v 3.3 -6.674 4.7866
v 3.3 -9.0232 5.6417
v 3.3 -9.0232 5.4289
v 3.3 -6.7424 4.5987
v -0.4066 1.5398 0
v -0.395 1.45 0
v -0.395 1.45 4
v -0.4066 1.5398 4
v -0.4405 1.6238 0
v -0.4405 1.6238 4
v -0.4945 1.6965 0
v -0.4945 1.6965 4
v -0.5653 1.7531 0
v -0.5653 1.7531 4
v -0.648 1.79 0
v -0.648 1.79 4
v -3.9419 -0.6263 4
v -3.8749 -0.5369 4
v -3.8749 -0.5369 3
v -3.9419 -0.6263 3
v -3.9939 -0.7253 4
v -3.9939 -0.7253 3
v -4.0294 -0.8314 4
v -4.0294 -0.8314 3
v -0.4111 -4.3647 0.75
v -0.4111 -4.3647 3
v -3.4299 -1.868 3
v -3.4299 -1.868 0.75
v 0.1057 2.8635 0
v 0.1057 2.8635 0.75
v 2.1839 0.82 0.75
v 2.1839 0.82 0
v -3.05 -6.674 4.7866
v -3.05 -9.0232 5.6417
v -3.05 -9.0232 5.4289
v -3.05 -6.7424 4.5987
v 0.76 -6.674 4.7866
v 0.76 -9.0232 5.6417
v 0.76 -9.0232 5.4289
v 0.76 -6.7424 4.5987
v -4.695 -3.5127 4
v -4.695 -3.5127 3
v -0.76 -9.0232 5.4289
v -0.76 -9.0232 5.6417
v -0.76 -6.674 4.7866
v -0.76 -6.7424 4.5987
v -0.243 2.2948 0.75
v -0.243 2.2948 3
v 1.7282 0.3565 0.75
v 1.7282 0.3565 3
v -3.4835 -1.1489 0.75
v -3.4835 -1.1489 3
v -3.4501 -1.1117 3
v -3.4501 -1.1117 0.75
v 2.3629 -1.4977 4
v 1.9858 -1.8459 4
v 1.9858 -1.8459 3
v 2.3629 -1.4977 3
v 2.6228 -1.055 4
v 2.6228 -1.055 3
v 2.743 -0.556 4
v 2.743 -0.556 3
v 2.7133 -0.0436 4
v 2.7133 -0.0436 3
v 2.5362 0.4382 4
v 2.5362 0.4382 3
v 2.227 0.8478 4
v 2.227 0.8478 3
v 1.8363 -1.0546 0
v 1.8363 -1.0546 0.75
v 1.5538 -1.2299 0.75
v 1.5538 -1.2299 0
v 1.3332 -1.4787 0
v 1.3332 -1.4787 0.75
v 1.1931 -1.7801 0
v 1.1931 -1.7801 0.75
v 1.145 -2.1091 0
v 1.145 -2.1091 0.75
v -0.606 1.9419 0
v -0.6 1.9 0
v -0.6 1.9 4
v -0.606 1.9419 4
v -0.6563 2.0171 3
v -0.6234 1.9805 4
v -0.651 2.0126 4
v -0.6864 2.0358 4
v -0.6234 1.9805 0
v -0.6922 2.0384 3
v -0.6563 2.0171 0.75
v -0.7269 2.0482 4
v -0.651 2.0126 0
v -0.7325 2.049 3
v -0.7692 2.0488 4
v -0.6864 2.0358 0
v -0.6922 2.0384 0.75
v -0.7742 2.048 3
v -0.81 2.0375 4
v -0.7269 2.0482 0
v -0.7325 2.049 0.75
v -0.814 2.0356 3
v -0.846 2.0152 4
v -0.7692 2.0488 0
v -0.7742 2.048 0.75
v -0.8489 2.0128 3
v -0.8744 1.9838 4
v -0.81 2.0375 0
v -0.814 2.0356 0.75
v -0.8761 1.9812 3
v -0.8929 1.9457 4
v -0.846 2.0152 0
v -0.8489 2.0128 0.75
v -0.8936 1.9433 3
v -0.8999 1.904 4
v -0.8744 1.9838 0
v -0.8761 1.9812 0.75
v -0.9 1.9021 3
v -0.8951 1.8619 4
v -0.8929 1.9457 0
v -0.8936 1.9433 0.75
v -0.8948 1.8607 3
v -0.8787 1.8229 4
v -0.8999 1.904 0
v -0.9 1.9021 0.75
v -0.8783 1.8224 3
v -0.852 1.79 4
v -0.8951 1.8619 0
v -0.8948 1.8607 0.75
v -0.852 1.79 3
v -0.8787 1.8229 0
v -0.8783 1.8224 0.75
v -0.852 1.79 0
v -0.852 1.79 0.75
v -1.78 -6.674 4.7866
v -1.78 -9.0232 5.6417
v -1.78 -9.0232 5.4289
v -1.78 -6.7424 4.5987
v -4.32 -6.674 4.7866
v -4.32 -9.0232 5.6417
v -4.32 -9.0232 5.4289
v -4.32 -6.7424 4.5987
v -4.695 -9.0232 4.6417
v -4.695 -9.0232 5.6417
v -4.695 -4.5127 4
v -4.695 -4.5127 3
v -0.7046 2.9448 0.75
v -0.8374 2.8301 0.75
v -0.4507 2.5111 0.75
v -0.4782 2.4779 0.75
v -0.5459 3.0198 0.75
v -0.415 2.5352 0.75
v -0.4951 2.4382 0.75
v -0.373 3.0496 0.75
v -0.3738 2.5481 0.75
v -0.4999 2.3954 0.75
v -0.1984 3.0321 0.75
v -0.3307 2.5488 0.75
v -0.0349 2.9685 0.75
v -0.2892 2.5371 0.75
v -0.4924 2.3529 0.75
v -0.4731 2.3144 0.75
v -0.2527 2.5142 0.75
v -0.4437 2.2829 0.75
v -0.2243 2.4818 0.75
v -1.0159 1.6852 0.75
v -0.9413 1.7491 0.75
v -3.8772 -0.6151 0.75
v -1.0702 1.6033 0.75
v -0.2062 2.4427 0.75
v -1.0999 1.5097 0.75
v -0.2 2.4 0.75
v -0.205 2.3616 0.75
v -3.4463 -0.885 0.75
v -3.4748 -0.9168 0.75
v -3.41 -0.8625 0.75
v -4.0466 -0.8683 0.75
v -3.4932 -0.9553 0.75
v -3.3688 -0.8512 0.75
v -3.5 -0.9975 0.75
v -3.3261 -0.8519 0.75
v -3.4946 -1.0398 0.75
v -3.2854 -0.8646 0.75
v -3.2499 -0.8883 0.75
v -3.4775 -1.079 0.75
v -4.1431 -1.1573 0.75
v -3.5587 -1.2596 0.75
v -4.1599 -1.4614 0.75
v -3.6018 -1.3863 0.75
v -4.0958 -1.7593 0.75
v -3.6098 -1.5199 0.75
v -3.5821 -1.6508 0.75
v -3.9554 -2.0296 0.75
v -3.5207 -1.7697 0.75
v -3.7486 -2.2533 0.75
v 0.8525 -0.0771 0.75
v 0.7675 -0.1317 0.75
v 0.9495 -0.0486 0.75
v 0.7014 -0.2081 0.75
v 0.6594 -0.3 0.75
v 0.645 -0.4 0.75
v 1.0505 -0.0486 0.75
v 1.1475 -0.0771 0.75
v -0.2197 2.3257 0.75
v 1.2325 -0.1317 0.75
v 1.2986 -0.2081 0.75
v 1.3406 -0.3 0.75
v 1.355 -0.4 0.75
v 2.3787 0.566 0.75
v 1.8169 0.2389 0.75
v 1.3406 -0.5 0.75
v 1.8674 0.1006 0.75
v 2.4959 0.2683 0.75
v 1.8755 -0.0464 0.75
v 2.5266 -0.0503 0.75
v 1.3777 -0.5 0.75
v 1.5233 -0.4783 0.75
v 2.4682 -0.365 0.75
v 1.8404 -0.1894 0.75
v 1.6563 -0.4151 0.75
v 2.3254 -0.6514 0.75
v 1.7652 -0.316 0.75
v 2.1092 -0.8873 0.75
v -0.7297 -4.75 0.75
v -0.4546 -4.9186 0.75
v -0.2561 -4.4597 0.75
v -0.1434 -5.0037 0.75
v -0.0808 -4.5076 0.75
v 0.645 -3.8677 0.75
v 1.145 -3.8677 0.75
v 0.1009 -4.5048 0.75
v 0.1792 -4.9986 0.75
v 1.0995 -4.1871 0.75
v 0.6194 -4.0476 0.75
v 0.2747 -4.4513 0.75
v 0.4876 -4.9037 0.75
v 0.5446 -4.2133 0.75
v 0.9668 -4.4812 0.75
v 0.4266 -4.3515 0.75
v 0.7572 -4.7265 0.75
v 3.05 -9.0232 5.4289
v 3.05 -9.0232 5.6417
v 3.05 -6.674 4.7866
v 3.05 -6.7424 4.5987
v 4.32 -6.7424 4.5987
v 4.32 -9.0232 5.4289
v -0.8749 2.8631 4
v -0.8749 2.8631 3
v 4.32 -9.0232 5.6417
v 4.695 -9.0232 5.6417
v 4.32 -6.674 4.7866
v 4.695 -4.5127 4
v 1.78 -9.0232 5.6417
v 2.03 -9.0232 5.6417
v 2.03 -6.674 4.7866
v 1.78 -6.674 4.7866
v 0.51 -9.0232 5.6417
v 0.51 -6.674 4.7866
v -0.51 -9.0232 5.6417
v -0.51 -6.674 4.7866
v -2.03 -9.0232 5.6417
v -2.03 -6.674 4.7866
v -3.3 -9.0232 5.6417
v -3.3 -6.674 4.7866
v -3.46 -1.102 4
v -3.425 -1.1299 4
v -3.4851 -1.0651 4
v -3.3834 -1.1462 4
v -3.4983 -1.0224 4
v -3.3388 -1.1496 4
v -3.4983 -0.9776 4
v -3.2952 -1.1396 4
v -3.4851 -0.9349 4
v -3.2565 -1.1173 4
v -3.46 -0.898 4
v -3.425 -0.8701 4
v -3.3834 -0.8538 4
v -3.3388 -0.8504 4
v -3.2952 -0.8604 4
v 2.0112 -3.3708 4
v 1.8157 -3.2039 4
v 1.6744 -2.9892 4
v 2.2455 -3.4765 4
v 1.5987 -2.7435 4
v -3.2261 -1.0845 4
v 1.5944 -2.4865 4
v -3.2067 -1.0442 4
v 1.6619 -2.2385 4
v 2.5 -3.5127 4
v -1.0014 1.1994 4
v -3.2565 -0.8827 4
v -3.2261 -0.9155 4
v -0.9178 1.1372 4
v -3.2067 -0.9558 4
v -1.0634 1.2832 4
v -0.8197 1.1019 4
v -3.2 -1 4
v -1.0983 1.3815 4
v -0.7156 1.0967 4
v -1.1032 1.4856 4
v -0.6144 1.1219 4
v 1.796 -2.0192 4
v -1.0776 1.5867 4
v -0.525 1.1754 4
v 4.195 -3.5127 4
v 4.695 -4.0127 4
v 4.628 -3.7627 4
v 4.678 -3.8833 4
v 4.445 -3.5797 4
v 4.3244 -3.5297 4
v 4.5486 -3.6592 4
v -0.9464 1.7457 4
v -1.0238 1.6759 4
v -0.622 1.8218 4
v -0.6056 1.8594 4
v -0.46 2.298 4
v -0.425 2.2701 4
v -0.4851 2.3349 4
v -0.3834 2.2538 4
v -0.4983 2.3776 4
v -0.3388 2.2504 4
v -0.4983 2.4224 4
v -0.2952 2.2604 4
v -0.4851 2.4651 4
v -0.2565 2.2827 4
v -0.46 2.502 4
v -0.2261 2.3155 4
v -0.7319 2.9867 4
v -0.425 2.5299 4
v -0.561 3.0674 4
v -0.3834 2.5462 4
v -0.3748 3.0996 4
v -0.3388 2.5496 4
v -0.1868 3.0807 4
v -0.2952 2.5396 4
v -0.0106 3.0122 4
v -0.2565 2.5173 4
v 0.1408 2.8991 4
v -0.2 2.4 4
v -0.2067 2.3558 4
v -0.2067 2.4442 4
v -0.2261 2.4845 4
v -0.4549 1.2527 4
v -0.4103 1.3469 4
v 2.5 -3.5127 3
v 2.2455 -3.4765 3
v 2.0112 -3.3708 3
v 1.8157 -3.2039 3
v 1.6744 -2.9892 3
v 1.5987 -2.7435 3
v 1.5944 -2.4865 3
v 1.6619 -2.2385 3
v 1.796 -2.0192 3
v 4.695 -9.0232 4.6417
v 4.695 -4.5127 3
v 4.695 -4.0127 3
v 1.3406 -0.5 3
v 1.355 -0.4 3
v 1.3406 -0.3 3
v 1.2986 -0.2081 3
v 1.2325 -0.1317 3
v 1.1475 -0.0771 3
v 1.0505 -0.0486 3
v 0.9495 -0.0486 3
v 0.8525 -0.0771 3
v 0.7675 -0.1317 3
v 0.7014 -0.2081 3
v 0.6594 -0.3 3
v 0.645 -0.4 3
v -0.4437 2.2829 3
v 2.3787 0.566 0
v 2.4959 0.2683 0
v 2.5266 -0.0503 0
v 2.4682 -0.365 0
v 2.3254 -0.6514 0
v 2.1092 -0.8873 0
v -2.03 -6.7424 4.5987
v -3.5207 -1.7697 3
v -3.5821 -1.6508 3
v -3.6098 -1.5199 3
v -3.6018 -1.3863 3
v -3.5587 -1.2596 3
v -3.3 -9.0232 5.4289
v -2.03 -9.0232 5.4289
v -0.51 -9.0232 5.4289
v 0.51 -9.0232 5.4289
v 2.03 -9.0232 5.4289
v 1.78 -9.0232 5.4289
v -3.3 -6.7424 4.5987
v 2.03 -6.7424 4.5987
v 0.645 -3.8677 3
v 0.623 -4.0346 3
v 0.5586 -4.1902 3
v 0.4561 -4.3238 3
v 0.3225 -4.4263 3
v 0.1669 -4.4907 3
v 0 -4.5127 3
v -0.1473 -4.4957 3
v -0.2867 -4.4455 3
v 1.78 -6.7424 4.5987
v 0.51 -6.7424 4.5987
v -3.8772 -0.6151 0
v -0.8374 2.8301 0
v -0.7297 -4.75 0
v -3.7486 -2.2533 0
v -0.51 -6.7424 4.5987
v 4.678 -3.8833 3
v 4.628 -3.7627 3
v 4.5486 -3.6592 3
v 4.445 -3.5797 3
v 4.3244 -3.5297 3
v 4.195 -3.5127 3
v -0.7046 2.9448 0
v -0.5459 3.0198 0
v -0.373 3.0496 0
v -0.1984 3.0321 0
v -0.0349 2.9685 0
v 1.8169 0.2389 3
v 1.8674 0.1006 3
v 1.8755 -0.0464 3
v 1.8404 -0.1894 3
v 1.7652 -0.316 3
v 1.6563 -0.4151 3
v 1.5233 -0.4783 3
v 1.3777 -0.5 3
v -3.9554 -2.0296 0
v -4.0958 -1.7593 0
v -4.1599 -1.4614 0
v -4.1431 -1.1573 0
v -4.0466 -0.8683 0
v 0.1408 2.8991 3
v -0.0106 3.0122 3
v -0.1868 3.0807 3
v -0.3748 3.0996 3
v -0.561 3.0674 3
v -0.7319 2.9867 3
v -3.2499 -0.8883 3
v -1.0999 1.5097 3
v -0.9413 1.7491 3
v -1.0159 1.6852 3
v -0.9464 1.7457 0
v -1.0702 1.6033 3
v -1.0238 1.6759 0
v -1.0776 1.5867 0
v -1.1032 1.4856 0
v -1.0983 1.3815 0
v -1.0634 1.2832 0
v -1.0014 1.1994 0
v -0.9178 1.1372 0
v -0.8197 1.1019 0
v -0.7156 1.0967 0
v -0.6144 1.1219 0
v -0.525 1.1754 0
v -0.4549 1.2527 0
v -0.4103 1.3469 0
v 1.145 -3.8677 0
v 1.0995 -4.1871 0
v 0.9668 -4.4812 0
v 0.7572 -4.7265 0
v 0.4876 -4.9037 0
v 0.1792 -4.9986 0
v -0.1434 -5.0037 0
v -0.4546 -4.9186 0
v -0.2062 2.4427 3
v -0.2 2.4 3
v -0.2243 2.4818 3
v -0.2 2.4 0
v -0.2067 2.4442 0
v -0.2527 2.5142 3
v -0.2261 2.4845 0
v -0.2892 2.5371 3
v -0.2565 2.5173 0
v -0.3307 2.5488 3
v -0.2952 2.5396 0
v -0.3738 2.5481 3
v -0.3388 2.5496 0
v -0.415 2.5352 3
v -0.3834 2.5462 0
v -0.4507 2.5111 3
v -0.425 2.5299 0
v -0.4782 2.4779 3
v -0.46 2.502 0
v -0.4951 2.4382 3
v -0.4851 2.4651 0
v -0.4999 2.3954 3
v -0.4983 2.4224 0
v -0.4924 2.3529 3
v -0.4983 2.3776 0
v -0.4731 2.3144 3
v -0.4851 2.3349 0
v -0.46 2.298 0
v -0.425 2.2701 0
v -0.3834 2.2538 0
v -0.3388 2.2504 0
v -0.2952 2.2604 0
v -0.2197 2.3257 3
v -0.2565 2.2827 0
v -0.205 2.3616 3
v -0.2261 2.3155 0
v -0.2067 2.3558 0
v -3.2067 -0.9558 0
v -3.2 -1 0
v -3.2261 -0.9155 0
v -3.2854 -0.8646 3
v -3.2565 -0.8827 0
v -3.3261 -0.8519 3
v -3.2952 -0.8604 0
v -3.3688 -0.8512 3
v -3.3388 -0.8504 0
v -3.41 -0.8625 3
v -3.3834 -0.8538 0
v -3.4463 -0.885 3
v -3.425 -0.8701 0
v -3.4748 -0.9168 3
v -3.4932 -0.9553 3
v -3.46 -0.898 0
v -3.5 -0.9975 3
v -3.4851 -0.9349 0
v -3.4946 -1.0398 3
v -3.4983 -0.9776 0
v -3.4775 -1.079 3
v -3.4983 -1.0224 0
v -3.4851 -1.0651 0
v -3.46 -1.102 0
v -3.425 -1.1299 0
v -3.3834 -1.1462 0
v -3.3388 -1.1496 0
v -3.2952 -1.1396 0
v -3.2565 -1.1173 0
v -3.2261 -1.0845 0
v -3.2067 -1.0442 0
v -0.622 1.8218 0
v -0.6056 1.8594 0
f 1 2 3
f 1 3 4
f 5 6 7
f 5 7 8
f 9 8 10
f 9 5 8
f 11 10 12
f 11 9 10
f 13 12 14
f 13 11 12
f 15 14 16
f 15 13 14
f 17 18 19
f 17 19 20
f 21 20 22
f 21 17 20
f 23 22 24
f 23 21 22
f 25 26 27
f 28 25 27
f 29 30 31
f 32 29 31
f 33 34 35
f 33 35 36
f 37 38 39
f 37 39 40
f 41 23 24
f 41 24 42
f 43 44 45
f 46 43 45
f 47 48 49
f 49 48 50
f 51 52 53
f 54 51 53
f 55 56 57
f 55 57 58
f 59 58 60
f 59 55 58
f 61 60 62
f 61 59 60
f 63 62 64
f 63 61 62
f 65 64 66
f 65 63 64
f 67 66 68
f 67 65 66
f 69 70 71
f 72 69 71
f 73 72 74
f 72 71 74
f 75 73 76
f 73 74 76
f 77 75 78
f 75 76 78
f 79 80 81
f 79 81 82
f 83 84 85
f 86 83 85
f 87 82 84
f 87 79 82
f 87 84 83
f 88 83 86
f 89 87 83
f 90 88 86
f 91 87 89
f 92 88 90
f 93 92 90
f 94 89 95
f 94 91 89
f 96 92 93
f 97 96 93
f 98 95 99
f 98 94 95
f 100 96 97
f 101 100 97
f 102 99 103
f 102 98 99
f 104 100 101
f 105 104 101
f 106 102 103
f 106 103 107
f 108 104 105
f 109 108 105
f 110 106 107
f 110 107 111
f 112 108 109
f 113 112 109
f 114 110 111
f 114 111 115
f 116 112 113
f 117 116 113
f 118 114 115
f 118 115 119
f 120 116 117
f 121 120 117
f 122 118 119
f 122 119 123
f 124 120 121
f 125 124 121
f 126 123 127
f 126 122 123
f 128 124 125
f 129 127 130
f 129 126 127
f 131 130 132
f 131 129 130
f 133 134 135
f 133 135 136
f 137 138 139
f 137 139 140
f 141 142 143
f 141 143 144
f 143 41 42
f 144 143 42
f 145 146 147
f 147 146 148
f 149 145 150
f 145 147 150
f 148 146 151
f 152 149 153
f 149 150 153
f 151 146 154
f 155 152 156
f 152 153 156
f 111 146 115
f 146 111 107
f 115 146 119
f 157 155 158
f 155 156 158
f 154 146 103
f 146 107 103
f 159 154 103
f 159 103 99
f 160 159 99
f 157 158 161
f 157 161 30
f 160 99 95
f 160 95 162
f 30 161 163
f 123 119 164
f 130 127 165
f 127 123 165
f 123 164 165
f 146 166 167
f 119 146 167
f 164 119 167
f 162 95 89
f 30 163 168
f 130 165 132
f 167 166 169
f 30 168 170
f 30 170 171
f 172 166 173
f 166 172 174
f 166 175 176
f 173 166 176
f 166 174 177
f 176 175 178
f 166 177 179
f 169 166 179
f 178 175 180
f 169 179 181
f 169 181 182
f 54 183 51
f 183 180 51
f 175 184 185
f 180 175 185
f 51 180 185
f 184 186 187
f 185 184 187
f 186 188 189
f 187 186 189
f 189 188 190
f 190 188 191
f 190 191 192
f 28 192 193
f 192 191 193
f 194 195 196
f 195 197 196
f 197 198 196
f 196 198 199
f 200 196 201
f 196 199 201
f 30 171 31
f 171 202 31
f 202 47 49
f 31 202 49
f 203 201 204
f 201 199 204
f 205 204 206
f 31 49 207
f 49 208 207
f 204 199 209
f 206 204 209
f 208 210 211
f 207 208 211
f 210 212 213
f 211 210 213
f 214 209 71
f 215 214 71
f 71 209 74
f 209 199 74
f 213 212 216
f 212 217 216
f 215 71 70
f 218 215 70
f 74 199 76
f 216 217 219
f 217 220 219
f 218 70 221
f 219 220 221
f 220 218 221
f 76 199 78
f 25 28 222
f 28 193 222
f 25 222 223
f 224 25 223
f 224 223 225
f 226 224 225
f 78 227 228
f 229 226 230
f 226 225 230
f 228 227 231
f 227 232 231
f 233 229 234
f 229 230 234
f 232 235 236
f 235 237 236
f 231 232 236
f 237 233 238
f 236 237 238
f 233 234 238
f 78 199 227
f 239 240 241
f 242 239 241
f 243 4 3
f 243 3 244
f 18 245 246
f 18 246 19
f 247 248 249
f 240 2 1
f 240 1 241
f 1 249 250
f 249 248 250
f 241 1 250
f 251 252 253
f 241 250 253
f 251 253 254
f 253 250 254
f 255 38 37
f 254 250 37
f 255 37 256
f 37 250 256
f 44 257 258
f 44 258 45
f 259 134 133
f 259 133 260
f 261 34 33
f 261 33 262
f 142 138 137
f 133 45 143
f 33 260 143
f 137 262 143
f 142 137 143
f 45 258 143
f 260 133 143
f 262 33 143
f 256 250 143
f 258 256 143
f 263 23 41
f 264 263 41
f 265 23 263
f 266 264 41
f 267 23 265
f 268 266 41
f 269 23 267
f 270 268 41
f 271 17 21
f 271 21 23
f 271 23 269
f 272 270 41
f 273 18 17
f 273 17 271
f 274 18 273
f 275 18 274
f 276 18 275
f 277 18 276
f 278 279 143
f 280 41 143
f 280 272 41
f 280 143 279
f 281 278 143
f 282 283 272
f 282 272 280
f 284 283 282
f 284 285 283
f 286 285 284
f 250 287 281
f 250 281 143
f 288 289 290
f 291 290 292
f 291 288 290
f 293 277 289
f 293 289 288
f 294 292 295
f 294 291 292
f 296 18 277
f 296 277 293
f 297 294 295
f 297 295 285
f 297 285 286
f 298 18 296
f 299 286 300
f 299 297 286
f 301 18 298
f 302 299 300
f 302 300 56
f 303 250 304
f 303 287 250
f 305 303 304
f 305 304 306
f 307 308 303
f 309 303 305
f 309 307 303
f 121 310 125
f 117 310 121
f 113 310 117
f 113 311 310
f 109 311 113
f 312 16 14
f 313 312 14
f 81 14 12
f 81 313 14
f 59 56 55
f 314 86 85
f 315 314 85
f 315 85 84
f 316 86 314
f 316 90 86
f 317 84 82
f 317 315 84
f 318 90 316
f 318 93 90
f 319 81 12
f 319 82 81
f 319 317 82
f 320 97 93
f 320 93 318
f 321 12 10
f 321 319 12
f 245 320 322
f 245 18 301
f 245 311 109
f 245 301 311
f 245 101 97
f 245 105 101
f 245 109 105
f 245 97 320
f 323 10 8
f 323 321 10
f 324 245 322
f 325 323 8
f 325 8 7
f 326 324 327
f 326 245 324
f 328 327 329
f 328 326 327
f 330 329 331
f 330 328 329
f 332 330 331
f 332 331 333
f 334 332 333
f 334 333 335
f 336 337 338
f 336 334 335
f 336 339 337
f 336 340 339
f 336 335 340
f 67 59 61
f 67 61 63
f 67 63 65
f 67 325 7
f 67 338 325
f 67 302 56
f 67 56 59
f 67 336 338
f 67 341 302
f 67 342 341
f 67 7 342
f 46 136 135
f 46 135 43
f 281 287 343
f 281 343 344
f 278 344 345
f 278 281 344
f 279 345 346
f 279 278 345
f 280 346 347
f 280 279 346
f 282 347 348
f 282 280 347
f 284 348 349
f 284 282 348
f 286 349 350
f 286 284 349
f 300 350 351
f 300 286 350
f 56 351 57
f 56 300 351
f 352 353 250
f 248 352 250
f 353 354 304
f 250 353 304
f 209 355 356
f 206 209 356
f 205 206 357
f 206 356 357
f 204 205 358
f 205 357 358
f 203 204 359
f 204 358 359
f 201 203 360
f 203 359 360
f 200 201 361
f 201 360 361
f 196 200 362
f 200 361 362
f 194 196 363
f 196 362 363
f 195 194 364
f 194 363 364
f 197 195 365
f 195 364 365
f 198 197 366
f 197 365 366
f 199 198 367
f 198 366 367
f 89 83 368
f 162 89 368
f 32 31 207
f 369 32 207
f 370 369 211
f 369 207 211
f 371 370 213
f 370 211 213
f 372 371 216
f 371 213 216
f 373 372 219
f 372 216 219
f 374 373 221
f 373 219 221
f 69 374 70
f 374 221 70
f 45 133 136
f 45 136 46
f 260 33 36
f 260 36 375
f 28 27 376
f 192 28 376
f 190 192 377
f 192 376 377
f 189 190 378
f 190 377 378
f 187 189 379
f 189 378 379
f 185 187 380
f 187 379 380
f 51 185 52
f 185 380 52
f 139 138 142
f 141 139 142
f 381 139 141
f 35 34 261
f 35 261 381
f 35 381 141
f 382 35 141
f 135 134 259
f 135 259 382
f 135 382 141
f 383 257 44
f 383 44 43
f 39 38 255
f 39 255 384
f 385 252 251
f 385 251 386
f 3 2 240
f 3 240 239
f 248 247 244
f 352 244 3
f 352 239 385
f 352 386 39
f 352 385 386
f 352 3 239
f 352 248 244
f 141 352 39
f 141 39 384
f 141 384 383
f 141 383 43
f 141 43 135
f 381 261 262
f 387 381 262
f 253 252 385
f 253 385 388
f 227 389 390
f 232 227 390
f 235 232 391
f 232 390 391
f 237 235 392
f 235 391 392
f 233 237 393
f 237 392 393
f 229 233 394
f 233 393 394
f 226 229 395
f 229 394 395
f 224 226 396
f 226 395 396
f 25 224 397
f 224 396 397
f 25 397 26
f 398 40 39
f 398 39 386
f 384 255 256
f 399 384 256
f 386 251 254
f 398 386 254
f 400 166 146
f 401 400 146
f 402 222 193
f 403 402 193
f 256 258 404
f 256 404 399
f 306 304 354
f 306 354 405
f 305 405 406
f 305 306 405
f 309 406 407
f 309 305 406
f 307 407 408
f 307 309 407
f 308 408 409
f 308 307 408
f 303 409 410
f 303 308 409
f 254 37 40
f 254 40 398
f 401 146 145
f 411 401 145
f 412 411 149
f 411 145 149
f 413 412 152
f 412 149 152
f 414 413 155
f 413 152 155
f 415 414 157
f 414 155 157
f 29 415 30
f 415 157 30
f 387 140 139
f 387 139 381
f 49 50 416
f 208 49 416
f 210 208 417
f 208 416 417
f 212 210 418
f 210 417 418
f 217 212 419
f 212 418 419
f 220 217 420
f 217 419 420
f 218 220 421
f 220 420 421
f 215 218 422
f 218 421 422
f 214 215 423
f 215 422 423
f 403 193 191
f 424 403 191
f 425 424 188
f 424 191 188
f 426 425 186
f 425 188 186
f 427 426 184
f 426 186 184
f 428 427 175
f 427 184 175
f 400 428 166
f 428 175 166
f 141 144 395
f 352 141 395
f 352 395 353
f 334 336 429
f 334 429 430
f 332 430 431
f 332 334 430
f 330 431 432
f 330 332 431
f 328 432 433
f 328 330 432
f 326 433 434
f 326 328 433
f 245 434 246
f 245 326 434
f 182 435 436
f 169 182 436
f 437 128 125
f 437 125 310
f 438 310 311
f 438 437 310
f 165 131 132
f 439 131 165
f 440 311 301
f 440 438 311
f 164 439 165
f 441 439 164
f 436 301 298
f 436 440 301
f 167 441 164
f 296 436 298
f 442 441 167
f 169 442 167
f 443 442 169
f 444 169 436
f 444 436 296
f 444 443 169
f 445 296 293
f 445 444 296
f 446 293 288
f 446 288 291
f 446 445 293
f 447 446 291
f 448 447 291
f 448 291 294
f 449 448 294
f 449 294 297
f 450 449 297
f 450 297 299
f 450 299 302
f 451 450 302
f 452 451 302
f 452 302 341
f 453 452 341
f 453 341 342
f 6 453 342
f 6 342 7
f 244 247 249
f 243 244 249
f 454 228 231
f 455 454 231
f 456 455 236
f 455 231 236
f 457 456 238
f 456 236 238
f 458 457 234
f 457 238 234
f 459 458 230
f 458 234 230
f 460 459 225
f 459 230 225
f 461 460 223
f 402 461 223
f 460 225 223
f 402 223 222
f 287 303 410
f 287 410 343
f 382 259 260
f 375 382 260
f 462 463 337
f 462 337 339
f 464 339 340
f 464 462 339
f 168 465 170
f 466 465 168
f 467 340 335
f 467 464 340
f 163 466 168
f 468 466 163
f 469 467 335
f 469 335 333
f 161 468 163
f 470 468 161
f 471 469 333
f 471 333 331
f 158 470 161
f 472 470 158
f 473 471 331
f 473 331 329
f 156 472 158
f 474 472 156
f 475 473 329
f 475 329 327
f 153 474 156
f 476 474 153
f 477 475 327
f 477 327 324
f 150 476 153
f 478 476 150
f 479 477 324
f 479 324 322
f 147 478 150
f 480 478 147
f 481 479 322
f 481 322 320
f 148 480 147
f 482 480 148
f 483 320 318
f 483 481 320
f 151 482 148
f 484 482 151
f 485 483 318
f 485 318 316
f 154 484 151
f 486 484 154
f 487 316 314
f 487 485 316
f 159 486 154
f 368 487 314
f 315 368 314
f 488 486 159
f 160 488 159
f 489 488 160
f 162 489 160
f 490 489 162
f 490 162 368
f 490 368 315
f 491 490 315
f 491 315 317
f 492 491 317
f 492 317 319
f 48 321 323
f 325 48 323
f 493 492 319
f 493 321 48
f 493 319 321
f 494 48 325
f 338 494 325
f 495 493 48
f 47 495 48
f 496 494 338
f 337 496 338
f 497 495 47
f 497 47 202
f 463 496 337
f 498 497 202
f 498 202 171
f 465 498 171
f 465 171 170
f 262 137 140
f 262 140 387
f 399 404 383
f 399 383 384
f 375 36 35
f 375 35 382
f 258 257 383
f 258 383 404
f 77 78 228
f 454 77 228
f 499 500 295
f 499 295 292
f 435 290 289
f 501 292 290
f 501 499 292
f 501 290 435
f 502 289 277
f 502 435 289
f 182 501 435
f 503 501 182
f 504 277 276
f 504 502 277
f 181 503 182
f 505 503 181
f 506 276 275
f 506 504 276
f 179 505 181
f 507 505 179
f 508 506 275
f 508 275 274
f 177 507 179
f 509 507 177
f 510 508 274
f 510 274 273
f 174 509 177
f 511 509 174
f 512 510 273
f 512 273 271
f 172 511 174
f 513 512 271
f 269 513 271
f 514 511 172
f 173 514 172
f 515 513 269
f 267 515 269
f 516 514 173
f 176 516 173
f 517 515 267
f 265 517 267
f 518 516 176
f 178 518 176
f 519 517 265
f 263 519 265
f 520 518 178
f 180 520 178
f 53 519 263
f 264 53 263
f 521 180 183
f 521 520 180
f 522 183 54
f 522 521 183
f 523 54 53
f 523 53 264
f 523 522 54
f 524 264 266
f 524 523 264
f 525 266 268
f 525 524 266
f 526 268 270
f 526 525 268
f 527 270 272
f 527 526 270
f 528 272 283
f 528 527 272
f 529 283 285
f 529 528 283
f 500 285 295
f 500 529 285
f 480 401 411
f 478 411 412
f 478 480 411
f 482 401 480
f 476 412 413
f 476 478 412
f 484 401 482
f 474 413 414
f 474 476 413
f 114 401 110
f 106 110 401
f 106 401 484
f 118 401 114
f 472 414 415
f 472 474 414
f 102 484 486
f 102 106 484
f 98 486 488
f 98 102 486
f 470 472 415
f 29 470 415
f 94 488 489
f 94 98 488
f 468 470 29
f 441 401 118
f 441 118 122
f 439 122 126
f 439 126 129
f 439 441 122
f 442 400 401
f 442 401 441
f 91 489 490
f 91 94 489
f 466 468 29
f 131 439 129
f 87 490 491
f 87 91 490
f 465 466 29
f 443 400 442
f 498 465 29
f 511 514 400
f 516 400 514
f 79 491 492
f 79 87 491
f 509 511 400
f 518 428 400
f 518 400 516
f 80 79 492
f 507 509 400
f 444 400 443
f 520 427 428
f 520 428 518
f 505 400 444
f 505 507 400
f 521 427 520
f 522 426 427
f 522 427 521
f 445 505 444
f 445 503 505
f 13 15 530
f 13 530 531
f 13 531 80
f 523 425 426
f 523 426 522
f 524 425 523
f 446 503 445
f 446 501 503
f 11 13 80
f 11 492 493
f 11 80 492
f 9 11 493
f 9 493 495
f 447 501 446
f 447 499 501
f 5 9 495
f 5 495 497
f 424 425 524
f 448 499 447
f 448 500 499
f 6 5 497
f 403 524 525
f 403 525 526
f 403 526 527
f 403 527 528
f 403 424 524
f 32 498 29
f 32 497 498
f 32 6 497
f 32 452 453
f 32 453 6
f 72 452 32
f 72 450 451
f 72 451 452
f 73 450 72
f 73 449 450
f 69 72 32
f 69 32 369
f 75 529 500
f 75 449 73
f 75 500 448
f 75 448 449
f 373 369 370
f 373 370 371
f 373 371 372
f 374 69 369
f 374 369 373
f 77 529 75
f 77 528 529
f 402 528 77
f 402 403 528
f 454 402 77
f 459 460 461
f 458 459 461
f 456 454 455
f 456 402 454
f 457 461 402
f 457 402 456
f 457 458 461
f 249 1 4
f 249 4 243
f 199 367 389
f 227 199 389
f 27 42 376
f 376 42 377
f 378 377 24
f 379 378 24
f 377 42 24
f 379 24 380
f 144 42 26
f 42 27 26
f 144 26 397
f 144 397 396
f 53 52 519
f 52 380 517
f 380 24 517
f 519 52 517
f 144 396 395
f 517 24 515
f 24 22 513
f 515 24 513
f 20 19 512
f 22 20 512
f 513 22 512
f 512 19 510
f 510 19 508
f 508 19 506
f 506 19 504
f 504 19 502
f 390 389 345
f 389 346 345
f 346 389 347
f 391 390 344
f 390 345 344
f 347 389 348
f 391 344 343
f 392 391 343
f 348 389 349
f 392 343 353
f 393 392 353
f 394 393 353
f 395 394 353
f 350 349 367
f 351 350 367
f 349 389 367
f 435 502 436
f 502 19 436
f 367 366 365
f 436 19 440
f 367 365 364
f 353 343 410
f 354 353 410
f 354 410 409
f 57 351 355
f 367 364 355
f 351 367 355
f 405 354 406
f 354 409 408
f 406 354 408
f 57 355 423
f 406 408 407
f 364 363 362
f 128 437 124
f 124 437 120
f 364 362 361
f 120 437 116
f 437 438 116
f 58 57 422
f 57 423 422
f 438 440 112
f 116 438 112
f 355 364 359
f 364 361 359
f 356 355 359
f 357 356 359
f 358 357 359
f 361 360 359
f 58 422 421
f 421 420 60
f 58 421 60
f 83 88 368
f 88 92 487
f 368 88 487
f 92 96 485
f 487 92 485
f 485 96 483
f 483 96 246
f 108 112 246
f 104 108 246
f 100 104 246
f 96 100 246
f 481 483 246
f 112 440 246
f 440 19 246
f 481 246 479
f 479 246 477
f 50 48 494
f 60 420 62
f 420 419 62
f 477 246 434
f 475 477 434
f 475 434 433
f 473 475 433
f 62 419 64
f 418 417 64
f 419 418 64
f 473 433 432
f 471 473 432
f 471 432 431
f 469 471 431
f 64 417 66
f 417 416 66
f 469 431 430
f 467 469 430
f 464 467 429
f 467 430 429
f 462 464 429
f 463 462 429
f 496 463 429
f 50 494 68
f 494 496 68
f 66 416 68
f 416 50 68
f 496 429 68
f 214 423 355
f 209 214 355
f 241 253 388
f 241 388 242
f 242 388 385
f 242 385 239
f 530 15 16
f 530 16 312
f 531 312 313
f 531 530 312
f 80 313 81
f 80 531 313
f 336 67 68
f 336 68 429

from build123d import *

# Parameters (mm, degrees)
F3_R      = 0.15
F4_DEPTH  = 4
F3_R_2    = 0.85
F6_DEPTH  = 1
F8_DEPTH  = 2.25
F10_DEPTH = 0.75
F14_W     = 1.02
F14_H     = 2.5
F15_DEPTH = 0.2


with BuildPart() as f4:
    # F3 (on Top) → F4 (new body)
    with BuildSketch(Plane.XY):
        with Locations((-3.35, -1)):
            Circle(F3_R)
    extrude(amount=F4_DEPTH)


with BuildPart() as f4b:
    # F3 (on Top) → F4, piece 2 (new body)
    with BuildSketch(Plane.XY):
        with BuildLine():
            ThreePointArc((-0.6479896557, 1.7900277778), (-0.6125199075, 1.8400064655), (-0.6, 1.9))
            ThreePointArc((-0.6, 1.9), (-0.8099935345, 2.0374800925), (-0.8520103443, 1.7900277778))
            ThreePointArc((-0.8520103443, 1.7900277778), (-0.75, 1.805), (-0.6479896557, 1.7900277778))
        make_face()
        with BuildLine():
            ThreePointArc((-0.6479896557, 1.7900277778), (-0.75, 1.805), (-0.8520103443, 1.7900277778))
            ThreePointArc((-0.8520103443, 1.7900277778), (-0.75, 1.75), (-0.6479896557, 1.7900277778))
        make_face()
        with BuildLine():
            ThreePointArc((-0.6479896557, 1.7900277778), (-0.75, 1.75), (-0.8520103443, 1.7900277778))
            ThreePointArc((-0.8520103443, 1.7900277778), (-0.9619095654, 1.1651854356), (-0.395, 1.45))
            ThreePointArc((-0.395, 1.45), (-0.4651854356, 1.6619095654), (-0.6479896557, 1.7900277778))
        make_face()
    extrude(amount=F4_DEPTH)


with BuildPart() as f4c:
    # F3 (on Top) → F4, piece 3 (new body)
    with BuildSketch(Plane.XY):
        with Locations((-0.35, 2.4)):
            Circle(F3_R)
    extrude(amount=F4_DEPTH)


with BuildPart() as f4d:
    # F3 (on Top) → F4, piece 4 (new body)
    with BuildSketch(Plane.XY):
        with Locations((2.5, -2.6)):
            Circle(F3_R_2)
    extrude(amount=F4_DEPTH)


with BuildPart() as f6:
    # F5 (on face) → F6 (new body)
    with BuildSketch(Plane.XY.offset(4)):
        with BuildLine():
            ThreePointArc((1.9858394431, -1.8458978499), (2.7430307581, -0.5560249217), (2.2269639391, 0.8478218992))
            Line((2.2269639391, 0.8478218992), (0.1407855756, 2.8991287597))
            ThreePointArc((0.1407855756, 2.8991287597), (-0.3747911939, 3.0995608599), (-0.8748864988, 2.863135146))
            Line((-0.8748864988, 2.863135146), (-3.8748864988, -0.536864854))
            ThreePointArc((-3.8748864988, -0.536864854), (-3.9698749845, -0.674800056), (-4.0293801406, -0.831350587))
            Line((-4.0293801406, -0.831350587), (-4.695, -3.5127053911))
            Line((-4.695, -3.5127053911), (-4.695, -4.5127053911))
            Line((-4.695, -4.5127053911), (4.695, -4.5127053911))
            Line((4.695, -4.5127053911), (4.695, -4.0127053911))
            ThreePointArc((4.695, -4.0127053911), (4.5485533906, -3.6591520005), (4.195, -3.5127053911))
            Line((4.195, -3.5127053911), (2.5, -3.5127053911))
            ThreePointArc((2.5, -3.5127053911), (1.6278462782, -2.869033486), (1.9858394431, -1.8458978499))
        make_face()
    extrude(amount=-F6_DEPTH)

    # F7 (on face) → F8 (join)
    with BuildSketch(Plane(origin=(0, 0, 3), x_dir=(1, 0, 0), z_dir=(0, 0, -1))):
        with BuildLine():
            ThreePointArc((0.645, 3.8677053911), (0.2746634171, 4.4513020046), (-0.411077542, 4.3647368333))
            Line((-0.411077542, 4.3647368333), (-3.429889044, 1.8679820876))
            ThreePointArc((-3.429889044, 1.8679820876), (-3.6098399318, 1.5198675017), (-3.4835090032, 1.1489138881))
            Line((-3.4835090032, 1.1489138881), (-0.75, -1.9))
            Line((-0.75, -1.9), (-0.35, -2.4))
            Line((-0.35, -2.4), (1.7282178972, -0.3565205426))
            ThreePointArc((1.7282178972, -0.3565205426), (1.840398747, 0.1893934116), (1.3776567718, 0.5))
            Line((1.3776567718, 0.5), (1.3406244266, 0.5))
            ThreePointArc((1.3406244266, 0.5), (1.0505140008, 0.0486122715), (0.645, 0.4))
            Line((0.645, 0.4), (0.645, 3.8677053911))
        make_face()
    extrude(amount=F8_DEPTH)

    # F9 (on face) → F10 (join)
    with BuildSketch(Plane(origin=(0, 0, 0.75), x_dir=(1, 0, 0), z_dir=(0, 0, -1))):
        with BuildLine():
            ThreePointArc((-3.7485538053, 2.2532777792), (-4.1598651003, 1.4614479318), (-3.8772413796, 0.6151056127))
            Line((-3.8772413796, 0.6151056127), (-0.837394606, -2.8300540641))
            ThreePointArc((-0.837394606, -2.8300540641), (-0.3730203944, -3.049592227), (0.1057294631, -2.8634767054))
            Line((0.1057294631, -2.8634767054), (2.1839473603, -0.8199972481))
            ThreePointArc((2.1839473603, -0.8199972481), (2.5083795632, 0.2096806356), (1.8363283859, 1.054571169))
            ThreePointArc((1.8363283859, 1.054571169), (1.3332379826, 1.4786553659), (1.145, 2.1091423379))
            Line((1.145, 2.1091423379), (1.145, 3.8677053911))
            ThreePointArc((1.145, 3.8677053911), (0.4875807948, 4.9037024802), (-0.7297423032, 4.7500325249))
            Line((-0.7297423032, 4.7500325249), (-3.7485538053, 2.2532777792))
        make_face()
    extrude(amount=F10_DEPTH)

    # F11: cut F4, F4b, F4c, F4d
    add(f4.part, mode=Mode.SUBTRACT)
    add(f4b.part, mode=Mode.SUBTRACT)
    add(f4c.part, mode=Mode.SUBTRACT)
    add(f4d.part, mode=Mode.SUBTRACT)

    # F13: sweep along a path in F12
    with BuildLine(Plane.YZ) as f13_path:
        Line((-9.0232299709, 5.641696688), (-4.5127053911, 4))
    # F6_face1 (on face) → F13 (sweep)
    with BuildSketch(Plane(origin=(0, -4.5127053911, 3.5), x_dir=(1, 0, 0), z_dir=(0, -1, 0))):
        Polygon((-4.695, 0.5), (-4.695, -0.5), (0, -0.5), (4.695, -0.5), (4.695, 0.5), align=None)
    sweep(path=f13_path.line)

    # F14 (on face) → F15 (cut)
    with BuildSketch(Plane(origin=(0, 0.757688968, 2.0817333304), x_dir=(1, 0, 0), z_dir=(0, 0.3420201433, 0.9396926208))):
        with Locations((-3.81, -9.1586365291)):
            Rectangle(F14_W, F14_H)
        with Locations((-2.54, -9.1586365291)):
            Rectangle(F14_W, F14_H)
        with Locations((-1.27, -9.1586365291)):
            Rectangle(F14_W, F14_H)
        with Locations((0, -9.1586365291)):
            Rectangle(F14_W, F14_H)
        with Locations((1.27, -9.1586365291)):
            Rectangle(F14_W, F14_H)
        with Locations((2.54, -9.1586365291)):
            Rectangle(F14_W, F14_H)
        with Locations((3.81, -9.1586365291)):
            Rectangle(F14_W, F14_H)
    extrude(amount=-F15_DEPTH, mode=Mode.SUBTRACT)


solid = f6.part
